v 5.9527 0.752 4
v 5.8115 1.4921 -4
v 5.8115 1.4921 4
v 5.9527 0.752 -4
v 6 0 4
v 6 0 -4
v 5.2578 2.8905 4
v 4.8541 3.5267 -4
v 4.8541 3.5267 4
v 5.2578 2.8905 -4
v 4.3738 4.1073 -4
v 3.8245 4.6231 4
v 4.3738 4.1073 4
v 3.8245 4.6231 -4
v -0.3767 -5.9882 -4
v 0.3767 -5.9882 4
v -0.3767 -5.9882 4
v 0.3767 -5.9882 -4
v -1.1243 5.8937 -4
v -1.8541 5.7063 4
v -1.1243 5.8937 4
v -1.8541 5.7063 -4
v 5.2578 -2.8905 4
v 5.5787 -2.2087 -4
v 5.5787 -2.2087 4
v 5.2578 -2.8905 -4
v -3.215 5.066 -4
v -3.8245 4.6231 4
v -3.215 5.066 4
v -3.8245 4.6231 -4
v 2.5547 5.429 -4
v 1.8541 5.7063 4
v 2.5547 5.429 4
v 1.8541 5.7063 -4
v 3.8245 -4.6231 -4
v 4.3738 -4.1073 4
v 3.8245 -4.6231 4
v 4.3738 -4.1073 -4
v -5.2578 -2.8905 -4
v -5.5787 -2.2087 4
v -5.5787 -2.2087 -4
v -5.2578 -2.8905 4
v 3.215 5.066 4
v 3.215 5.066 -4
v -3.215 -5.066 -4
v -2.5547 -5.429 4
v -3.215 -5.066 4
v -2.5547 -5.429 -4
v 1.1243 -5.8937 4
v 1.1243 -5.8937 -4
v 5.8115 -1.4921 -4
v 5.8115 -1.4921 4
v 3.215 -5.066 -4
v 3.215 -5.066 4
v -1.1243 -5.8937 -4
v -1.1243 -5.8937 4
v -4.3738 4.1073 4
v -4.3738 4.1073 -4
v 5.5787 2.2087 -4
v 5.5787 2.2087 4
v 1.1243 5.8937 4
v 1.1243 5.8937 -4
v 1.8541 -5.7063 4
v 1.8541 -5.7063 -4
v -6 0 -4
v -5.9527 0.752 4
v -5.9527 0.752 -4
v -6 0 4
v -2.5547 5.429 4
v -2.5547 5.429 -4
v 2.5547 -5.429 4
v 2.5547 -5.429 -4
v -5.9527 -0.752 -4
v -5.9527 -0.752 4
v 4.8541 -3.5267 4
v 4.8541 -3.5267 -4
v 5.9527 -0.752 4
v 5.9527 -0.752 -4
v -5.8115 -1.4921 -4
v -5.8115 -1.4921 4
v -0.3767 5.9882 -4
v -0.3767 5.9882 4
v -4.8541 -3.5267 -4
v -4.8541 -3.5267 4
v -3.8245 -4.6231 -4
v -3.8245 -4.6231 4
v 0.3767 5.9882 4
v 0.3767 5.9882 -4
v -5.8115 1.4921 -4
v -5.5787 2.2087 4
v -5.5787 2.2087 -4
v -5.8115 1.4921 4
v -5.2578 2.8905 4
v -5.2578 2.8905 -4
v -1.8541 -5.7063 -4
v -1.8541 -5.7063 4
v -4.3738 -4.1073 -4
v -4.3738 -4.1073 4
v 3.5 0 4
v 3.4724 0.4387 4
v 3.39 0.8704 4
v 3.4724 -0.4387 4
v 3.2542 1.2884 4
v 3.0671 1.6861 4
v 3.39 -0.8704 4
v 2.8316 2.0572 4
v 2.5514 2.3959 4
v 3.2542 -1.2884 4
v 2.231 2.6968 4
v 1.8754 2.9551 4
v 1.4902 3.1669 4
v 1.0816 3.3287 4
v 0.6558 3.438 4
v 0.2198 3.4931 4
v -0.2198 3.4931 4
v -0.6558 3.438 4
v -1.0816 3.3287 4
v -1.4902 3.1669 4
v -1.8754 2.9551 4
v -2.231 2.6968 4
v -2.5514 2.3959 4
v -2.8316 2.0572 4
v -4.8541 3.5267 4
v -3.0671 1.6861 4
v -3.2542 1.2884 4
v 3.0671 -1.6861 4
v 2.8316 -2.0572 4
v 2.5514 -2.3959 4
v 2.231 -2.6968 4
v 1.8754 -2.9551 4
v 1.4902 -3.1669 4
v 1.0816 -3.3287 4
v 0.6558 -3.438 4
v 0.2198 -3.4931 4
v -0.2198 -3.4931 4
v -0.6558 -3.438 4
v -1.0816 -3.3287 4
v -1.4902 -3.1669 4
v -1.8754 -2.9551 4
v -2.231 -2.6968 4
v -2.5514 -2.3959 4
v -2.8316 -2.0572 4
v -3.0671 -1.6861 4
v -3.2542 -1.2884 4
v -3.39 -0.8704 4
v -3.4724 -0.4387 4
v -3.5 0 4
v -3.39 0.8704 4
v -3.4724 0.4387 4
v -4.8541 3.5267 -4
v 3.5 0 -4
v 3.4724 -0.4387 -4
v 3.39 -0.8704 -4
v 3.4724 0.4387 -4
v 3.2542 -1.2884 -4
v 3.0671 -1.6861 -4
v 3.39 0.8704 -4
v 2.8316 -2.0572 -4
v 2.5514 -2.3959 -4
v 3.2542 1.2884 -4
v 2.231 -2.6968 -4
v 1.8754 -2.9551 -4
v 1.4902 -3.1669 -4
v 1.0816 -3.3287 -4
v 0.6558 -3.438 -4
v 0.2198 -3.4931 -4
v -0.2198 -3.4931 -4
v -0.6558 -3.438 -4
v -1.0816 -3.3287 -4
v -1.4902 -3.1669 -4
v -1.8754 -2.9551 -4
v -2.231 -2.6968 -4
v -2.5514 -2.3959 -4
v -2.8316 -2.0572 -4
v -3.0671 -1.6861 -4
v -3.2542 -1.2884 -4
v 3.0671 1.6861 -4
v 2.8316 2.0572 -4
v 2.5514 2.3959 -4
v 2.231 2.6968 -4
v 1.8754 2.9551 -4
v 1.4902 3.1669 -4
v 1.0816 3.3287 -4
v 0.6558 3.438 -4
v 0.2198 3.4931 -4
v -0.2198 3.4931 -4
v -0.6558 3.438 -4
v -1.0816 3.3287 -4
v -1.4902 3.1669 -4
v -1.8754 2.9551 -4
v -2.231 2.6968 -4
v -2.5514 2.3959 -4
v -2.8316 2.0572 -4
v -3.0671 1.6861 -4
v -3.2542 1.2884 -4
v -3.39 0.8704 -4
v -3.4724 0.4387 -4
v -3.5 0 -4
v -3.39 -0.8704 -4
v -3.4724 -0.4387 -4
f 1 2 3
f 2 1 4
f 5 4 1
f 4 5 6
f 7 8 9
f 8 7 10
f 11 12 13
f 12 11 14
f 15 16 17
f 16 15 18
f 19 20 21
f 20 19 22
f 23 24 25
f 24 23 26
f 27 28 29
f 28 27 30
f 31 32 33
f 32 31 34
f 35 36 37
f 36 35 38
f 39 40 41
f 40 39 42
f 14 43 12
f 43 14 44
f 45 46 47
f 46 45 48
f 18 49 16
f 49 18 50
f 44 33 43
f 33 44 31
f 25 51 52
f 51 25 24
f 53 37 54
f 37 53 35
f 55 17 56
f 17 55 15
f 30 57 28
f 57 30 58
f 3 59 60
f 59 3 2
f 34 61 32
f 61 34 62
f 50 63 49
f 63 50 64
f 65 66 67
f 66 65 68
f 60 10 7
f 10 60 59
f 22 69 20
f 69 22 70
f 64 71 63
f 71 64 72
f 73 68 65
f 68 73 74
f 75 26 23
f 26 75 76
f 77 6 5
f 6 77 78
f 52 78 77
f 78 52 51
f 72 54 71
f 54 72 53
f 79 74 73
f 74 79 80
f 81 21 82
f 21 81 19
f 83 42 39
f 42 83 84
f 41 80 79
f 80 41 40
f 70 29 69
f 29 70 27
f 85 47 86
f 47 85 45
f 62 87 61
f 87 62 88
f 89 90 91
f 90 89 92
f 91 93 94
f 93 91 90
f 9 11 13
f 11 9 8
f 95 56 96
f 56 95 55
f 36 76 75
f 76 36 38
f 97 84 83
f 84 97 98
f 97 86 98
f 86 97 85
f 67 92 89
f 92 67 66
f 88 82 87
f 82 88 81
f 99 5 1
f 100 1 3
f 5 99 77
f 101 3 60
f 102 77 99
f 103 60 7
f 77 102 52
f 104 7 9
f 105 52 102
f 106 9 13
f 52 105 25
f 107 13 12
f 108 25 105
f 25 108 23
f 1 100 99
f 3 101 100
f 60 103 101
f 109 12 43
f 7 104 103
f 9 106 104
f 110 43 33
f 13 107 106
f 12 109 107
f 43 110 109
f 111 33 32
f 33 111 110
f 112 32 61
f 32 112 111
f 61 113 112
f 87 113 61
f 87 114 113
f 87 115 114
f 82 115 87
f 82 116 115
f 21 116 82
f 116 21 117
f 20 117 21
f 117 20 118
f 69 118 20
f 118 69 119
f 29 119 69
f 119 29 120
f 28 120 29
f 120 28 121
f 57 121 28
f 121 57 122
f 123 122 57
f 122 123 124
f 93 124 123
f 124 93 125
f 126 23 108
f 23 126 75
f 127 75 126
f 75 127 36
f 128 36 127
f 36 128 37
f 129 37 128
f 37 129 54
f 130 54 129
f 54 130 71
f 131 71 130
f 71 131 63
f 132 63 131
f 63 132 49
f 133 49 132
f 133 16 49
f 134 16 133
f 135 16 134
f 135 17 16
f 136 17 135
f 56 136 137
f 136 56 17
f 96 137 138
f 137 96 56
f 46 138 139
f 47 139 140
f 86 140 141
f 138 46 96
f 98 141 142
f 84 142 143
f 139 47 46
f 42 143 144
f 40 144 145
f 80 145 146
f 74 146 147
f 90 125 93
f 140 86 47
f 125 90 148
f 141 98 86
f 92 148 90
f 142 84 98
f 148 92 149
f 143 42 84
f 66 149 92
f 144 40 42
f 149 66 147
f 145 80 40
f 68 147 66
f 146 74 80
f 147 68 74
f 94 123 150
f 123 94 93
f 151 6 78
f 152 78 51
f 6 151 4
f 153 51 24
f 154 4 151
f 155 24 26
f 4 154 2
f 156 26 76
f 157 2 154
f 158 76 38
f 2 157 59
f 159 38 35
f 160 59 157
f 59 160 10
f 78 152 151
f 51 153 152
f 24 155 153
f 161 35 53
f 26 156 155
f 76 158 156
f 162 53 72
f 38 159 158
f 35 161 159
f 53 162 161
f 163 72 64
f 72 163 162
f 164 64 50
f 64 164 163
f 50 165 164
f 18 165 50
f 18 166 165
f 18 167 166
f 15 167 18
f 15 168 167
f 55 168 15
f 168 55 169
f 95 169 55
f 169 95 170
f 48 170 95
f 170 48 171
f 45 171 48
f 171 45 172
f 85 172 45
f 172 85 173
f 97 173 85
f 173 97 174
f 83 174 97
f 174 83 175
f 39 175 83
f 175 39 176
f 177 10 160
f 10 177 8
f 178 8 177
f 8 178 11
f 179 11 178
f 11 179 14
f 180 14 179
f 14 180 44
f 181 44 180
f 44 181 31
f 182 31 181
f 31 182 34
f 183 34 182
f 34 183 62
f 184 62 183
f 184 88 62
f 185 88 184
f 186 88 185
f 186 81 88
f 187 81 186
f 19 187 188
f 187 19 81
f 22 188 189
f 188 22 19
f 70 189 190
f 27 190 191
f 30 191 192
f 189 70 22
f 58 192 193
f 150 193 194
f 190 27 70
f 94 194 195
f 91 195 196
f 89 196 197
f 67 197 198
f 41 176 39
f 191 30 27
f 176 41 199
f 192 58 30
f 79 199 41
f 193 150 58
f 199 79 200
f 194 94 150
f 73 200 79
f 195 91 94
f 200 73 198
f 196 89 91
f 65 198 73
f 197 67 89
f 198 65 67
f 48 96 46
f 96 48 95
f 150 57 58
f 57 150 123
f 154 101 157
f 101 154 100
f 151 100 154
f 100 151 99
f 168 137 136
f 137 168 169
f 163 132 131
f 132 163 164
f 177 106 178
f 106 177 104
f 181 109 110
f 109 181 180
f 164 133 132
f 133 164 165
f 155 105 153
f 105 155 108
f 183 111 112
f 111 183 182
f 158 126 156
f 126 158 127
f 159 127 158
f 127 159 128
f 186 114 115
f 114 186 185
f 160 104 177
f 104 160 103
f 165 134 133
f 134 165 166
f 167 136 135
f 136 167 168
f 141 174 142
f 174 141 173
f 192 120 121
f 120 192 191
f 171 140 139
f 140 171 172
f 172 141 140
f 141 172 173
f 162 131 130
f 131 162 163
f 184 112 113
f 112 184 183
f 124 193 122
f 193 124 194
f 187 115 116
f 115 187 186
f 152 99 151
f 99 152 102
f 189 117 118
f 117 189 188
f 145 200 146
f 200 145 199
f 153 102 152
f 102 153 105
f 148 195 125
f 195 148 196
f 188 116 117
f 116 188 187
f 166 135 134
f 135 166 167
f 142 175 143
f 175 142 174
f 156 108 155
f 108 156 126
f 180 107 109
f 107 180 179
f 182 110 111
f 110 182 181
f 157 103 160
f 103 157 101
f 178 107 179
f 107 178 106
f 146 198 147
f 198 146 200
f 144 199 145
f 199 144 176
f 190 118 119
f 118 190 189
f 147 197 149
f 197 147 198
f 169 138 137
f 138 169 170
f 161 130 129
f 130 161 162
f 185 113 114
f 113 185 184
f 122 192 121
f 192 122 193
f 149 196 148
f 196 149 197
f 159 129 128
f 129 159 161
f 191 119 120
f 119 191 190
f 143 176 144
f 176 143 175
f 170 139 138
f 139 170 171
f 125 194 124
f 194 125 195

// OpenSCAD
$fn = 50;


difference() {
	union() {
		translate(v = [0, 0, -4.0000000000]) {
			cylinder(h = 8, r = 6.0000000000);
		}
	}
	union() {
		translate(v = [0, 0, -100.0000000000]) {
			cylinder(h = 200, r = 3.5000000000);
		}
	}
}
